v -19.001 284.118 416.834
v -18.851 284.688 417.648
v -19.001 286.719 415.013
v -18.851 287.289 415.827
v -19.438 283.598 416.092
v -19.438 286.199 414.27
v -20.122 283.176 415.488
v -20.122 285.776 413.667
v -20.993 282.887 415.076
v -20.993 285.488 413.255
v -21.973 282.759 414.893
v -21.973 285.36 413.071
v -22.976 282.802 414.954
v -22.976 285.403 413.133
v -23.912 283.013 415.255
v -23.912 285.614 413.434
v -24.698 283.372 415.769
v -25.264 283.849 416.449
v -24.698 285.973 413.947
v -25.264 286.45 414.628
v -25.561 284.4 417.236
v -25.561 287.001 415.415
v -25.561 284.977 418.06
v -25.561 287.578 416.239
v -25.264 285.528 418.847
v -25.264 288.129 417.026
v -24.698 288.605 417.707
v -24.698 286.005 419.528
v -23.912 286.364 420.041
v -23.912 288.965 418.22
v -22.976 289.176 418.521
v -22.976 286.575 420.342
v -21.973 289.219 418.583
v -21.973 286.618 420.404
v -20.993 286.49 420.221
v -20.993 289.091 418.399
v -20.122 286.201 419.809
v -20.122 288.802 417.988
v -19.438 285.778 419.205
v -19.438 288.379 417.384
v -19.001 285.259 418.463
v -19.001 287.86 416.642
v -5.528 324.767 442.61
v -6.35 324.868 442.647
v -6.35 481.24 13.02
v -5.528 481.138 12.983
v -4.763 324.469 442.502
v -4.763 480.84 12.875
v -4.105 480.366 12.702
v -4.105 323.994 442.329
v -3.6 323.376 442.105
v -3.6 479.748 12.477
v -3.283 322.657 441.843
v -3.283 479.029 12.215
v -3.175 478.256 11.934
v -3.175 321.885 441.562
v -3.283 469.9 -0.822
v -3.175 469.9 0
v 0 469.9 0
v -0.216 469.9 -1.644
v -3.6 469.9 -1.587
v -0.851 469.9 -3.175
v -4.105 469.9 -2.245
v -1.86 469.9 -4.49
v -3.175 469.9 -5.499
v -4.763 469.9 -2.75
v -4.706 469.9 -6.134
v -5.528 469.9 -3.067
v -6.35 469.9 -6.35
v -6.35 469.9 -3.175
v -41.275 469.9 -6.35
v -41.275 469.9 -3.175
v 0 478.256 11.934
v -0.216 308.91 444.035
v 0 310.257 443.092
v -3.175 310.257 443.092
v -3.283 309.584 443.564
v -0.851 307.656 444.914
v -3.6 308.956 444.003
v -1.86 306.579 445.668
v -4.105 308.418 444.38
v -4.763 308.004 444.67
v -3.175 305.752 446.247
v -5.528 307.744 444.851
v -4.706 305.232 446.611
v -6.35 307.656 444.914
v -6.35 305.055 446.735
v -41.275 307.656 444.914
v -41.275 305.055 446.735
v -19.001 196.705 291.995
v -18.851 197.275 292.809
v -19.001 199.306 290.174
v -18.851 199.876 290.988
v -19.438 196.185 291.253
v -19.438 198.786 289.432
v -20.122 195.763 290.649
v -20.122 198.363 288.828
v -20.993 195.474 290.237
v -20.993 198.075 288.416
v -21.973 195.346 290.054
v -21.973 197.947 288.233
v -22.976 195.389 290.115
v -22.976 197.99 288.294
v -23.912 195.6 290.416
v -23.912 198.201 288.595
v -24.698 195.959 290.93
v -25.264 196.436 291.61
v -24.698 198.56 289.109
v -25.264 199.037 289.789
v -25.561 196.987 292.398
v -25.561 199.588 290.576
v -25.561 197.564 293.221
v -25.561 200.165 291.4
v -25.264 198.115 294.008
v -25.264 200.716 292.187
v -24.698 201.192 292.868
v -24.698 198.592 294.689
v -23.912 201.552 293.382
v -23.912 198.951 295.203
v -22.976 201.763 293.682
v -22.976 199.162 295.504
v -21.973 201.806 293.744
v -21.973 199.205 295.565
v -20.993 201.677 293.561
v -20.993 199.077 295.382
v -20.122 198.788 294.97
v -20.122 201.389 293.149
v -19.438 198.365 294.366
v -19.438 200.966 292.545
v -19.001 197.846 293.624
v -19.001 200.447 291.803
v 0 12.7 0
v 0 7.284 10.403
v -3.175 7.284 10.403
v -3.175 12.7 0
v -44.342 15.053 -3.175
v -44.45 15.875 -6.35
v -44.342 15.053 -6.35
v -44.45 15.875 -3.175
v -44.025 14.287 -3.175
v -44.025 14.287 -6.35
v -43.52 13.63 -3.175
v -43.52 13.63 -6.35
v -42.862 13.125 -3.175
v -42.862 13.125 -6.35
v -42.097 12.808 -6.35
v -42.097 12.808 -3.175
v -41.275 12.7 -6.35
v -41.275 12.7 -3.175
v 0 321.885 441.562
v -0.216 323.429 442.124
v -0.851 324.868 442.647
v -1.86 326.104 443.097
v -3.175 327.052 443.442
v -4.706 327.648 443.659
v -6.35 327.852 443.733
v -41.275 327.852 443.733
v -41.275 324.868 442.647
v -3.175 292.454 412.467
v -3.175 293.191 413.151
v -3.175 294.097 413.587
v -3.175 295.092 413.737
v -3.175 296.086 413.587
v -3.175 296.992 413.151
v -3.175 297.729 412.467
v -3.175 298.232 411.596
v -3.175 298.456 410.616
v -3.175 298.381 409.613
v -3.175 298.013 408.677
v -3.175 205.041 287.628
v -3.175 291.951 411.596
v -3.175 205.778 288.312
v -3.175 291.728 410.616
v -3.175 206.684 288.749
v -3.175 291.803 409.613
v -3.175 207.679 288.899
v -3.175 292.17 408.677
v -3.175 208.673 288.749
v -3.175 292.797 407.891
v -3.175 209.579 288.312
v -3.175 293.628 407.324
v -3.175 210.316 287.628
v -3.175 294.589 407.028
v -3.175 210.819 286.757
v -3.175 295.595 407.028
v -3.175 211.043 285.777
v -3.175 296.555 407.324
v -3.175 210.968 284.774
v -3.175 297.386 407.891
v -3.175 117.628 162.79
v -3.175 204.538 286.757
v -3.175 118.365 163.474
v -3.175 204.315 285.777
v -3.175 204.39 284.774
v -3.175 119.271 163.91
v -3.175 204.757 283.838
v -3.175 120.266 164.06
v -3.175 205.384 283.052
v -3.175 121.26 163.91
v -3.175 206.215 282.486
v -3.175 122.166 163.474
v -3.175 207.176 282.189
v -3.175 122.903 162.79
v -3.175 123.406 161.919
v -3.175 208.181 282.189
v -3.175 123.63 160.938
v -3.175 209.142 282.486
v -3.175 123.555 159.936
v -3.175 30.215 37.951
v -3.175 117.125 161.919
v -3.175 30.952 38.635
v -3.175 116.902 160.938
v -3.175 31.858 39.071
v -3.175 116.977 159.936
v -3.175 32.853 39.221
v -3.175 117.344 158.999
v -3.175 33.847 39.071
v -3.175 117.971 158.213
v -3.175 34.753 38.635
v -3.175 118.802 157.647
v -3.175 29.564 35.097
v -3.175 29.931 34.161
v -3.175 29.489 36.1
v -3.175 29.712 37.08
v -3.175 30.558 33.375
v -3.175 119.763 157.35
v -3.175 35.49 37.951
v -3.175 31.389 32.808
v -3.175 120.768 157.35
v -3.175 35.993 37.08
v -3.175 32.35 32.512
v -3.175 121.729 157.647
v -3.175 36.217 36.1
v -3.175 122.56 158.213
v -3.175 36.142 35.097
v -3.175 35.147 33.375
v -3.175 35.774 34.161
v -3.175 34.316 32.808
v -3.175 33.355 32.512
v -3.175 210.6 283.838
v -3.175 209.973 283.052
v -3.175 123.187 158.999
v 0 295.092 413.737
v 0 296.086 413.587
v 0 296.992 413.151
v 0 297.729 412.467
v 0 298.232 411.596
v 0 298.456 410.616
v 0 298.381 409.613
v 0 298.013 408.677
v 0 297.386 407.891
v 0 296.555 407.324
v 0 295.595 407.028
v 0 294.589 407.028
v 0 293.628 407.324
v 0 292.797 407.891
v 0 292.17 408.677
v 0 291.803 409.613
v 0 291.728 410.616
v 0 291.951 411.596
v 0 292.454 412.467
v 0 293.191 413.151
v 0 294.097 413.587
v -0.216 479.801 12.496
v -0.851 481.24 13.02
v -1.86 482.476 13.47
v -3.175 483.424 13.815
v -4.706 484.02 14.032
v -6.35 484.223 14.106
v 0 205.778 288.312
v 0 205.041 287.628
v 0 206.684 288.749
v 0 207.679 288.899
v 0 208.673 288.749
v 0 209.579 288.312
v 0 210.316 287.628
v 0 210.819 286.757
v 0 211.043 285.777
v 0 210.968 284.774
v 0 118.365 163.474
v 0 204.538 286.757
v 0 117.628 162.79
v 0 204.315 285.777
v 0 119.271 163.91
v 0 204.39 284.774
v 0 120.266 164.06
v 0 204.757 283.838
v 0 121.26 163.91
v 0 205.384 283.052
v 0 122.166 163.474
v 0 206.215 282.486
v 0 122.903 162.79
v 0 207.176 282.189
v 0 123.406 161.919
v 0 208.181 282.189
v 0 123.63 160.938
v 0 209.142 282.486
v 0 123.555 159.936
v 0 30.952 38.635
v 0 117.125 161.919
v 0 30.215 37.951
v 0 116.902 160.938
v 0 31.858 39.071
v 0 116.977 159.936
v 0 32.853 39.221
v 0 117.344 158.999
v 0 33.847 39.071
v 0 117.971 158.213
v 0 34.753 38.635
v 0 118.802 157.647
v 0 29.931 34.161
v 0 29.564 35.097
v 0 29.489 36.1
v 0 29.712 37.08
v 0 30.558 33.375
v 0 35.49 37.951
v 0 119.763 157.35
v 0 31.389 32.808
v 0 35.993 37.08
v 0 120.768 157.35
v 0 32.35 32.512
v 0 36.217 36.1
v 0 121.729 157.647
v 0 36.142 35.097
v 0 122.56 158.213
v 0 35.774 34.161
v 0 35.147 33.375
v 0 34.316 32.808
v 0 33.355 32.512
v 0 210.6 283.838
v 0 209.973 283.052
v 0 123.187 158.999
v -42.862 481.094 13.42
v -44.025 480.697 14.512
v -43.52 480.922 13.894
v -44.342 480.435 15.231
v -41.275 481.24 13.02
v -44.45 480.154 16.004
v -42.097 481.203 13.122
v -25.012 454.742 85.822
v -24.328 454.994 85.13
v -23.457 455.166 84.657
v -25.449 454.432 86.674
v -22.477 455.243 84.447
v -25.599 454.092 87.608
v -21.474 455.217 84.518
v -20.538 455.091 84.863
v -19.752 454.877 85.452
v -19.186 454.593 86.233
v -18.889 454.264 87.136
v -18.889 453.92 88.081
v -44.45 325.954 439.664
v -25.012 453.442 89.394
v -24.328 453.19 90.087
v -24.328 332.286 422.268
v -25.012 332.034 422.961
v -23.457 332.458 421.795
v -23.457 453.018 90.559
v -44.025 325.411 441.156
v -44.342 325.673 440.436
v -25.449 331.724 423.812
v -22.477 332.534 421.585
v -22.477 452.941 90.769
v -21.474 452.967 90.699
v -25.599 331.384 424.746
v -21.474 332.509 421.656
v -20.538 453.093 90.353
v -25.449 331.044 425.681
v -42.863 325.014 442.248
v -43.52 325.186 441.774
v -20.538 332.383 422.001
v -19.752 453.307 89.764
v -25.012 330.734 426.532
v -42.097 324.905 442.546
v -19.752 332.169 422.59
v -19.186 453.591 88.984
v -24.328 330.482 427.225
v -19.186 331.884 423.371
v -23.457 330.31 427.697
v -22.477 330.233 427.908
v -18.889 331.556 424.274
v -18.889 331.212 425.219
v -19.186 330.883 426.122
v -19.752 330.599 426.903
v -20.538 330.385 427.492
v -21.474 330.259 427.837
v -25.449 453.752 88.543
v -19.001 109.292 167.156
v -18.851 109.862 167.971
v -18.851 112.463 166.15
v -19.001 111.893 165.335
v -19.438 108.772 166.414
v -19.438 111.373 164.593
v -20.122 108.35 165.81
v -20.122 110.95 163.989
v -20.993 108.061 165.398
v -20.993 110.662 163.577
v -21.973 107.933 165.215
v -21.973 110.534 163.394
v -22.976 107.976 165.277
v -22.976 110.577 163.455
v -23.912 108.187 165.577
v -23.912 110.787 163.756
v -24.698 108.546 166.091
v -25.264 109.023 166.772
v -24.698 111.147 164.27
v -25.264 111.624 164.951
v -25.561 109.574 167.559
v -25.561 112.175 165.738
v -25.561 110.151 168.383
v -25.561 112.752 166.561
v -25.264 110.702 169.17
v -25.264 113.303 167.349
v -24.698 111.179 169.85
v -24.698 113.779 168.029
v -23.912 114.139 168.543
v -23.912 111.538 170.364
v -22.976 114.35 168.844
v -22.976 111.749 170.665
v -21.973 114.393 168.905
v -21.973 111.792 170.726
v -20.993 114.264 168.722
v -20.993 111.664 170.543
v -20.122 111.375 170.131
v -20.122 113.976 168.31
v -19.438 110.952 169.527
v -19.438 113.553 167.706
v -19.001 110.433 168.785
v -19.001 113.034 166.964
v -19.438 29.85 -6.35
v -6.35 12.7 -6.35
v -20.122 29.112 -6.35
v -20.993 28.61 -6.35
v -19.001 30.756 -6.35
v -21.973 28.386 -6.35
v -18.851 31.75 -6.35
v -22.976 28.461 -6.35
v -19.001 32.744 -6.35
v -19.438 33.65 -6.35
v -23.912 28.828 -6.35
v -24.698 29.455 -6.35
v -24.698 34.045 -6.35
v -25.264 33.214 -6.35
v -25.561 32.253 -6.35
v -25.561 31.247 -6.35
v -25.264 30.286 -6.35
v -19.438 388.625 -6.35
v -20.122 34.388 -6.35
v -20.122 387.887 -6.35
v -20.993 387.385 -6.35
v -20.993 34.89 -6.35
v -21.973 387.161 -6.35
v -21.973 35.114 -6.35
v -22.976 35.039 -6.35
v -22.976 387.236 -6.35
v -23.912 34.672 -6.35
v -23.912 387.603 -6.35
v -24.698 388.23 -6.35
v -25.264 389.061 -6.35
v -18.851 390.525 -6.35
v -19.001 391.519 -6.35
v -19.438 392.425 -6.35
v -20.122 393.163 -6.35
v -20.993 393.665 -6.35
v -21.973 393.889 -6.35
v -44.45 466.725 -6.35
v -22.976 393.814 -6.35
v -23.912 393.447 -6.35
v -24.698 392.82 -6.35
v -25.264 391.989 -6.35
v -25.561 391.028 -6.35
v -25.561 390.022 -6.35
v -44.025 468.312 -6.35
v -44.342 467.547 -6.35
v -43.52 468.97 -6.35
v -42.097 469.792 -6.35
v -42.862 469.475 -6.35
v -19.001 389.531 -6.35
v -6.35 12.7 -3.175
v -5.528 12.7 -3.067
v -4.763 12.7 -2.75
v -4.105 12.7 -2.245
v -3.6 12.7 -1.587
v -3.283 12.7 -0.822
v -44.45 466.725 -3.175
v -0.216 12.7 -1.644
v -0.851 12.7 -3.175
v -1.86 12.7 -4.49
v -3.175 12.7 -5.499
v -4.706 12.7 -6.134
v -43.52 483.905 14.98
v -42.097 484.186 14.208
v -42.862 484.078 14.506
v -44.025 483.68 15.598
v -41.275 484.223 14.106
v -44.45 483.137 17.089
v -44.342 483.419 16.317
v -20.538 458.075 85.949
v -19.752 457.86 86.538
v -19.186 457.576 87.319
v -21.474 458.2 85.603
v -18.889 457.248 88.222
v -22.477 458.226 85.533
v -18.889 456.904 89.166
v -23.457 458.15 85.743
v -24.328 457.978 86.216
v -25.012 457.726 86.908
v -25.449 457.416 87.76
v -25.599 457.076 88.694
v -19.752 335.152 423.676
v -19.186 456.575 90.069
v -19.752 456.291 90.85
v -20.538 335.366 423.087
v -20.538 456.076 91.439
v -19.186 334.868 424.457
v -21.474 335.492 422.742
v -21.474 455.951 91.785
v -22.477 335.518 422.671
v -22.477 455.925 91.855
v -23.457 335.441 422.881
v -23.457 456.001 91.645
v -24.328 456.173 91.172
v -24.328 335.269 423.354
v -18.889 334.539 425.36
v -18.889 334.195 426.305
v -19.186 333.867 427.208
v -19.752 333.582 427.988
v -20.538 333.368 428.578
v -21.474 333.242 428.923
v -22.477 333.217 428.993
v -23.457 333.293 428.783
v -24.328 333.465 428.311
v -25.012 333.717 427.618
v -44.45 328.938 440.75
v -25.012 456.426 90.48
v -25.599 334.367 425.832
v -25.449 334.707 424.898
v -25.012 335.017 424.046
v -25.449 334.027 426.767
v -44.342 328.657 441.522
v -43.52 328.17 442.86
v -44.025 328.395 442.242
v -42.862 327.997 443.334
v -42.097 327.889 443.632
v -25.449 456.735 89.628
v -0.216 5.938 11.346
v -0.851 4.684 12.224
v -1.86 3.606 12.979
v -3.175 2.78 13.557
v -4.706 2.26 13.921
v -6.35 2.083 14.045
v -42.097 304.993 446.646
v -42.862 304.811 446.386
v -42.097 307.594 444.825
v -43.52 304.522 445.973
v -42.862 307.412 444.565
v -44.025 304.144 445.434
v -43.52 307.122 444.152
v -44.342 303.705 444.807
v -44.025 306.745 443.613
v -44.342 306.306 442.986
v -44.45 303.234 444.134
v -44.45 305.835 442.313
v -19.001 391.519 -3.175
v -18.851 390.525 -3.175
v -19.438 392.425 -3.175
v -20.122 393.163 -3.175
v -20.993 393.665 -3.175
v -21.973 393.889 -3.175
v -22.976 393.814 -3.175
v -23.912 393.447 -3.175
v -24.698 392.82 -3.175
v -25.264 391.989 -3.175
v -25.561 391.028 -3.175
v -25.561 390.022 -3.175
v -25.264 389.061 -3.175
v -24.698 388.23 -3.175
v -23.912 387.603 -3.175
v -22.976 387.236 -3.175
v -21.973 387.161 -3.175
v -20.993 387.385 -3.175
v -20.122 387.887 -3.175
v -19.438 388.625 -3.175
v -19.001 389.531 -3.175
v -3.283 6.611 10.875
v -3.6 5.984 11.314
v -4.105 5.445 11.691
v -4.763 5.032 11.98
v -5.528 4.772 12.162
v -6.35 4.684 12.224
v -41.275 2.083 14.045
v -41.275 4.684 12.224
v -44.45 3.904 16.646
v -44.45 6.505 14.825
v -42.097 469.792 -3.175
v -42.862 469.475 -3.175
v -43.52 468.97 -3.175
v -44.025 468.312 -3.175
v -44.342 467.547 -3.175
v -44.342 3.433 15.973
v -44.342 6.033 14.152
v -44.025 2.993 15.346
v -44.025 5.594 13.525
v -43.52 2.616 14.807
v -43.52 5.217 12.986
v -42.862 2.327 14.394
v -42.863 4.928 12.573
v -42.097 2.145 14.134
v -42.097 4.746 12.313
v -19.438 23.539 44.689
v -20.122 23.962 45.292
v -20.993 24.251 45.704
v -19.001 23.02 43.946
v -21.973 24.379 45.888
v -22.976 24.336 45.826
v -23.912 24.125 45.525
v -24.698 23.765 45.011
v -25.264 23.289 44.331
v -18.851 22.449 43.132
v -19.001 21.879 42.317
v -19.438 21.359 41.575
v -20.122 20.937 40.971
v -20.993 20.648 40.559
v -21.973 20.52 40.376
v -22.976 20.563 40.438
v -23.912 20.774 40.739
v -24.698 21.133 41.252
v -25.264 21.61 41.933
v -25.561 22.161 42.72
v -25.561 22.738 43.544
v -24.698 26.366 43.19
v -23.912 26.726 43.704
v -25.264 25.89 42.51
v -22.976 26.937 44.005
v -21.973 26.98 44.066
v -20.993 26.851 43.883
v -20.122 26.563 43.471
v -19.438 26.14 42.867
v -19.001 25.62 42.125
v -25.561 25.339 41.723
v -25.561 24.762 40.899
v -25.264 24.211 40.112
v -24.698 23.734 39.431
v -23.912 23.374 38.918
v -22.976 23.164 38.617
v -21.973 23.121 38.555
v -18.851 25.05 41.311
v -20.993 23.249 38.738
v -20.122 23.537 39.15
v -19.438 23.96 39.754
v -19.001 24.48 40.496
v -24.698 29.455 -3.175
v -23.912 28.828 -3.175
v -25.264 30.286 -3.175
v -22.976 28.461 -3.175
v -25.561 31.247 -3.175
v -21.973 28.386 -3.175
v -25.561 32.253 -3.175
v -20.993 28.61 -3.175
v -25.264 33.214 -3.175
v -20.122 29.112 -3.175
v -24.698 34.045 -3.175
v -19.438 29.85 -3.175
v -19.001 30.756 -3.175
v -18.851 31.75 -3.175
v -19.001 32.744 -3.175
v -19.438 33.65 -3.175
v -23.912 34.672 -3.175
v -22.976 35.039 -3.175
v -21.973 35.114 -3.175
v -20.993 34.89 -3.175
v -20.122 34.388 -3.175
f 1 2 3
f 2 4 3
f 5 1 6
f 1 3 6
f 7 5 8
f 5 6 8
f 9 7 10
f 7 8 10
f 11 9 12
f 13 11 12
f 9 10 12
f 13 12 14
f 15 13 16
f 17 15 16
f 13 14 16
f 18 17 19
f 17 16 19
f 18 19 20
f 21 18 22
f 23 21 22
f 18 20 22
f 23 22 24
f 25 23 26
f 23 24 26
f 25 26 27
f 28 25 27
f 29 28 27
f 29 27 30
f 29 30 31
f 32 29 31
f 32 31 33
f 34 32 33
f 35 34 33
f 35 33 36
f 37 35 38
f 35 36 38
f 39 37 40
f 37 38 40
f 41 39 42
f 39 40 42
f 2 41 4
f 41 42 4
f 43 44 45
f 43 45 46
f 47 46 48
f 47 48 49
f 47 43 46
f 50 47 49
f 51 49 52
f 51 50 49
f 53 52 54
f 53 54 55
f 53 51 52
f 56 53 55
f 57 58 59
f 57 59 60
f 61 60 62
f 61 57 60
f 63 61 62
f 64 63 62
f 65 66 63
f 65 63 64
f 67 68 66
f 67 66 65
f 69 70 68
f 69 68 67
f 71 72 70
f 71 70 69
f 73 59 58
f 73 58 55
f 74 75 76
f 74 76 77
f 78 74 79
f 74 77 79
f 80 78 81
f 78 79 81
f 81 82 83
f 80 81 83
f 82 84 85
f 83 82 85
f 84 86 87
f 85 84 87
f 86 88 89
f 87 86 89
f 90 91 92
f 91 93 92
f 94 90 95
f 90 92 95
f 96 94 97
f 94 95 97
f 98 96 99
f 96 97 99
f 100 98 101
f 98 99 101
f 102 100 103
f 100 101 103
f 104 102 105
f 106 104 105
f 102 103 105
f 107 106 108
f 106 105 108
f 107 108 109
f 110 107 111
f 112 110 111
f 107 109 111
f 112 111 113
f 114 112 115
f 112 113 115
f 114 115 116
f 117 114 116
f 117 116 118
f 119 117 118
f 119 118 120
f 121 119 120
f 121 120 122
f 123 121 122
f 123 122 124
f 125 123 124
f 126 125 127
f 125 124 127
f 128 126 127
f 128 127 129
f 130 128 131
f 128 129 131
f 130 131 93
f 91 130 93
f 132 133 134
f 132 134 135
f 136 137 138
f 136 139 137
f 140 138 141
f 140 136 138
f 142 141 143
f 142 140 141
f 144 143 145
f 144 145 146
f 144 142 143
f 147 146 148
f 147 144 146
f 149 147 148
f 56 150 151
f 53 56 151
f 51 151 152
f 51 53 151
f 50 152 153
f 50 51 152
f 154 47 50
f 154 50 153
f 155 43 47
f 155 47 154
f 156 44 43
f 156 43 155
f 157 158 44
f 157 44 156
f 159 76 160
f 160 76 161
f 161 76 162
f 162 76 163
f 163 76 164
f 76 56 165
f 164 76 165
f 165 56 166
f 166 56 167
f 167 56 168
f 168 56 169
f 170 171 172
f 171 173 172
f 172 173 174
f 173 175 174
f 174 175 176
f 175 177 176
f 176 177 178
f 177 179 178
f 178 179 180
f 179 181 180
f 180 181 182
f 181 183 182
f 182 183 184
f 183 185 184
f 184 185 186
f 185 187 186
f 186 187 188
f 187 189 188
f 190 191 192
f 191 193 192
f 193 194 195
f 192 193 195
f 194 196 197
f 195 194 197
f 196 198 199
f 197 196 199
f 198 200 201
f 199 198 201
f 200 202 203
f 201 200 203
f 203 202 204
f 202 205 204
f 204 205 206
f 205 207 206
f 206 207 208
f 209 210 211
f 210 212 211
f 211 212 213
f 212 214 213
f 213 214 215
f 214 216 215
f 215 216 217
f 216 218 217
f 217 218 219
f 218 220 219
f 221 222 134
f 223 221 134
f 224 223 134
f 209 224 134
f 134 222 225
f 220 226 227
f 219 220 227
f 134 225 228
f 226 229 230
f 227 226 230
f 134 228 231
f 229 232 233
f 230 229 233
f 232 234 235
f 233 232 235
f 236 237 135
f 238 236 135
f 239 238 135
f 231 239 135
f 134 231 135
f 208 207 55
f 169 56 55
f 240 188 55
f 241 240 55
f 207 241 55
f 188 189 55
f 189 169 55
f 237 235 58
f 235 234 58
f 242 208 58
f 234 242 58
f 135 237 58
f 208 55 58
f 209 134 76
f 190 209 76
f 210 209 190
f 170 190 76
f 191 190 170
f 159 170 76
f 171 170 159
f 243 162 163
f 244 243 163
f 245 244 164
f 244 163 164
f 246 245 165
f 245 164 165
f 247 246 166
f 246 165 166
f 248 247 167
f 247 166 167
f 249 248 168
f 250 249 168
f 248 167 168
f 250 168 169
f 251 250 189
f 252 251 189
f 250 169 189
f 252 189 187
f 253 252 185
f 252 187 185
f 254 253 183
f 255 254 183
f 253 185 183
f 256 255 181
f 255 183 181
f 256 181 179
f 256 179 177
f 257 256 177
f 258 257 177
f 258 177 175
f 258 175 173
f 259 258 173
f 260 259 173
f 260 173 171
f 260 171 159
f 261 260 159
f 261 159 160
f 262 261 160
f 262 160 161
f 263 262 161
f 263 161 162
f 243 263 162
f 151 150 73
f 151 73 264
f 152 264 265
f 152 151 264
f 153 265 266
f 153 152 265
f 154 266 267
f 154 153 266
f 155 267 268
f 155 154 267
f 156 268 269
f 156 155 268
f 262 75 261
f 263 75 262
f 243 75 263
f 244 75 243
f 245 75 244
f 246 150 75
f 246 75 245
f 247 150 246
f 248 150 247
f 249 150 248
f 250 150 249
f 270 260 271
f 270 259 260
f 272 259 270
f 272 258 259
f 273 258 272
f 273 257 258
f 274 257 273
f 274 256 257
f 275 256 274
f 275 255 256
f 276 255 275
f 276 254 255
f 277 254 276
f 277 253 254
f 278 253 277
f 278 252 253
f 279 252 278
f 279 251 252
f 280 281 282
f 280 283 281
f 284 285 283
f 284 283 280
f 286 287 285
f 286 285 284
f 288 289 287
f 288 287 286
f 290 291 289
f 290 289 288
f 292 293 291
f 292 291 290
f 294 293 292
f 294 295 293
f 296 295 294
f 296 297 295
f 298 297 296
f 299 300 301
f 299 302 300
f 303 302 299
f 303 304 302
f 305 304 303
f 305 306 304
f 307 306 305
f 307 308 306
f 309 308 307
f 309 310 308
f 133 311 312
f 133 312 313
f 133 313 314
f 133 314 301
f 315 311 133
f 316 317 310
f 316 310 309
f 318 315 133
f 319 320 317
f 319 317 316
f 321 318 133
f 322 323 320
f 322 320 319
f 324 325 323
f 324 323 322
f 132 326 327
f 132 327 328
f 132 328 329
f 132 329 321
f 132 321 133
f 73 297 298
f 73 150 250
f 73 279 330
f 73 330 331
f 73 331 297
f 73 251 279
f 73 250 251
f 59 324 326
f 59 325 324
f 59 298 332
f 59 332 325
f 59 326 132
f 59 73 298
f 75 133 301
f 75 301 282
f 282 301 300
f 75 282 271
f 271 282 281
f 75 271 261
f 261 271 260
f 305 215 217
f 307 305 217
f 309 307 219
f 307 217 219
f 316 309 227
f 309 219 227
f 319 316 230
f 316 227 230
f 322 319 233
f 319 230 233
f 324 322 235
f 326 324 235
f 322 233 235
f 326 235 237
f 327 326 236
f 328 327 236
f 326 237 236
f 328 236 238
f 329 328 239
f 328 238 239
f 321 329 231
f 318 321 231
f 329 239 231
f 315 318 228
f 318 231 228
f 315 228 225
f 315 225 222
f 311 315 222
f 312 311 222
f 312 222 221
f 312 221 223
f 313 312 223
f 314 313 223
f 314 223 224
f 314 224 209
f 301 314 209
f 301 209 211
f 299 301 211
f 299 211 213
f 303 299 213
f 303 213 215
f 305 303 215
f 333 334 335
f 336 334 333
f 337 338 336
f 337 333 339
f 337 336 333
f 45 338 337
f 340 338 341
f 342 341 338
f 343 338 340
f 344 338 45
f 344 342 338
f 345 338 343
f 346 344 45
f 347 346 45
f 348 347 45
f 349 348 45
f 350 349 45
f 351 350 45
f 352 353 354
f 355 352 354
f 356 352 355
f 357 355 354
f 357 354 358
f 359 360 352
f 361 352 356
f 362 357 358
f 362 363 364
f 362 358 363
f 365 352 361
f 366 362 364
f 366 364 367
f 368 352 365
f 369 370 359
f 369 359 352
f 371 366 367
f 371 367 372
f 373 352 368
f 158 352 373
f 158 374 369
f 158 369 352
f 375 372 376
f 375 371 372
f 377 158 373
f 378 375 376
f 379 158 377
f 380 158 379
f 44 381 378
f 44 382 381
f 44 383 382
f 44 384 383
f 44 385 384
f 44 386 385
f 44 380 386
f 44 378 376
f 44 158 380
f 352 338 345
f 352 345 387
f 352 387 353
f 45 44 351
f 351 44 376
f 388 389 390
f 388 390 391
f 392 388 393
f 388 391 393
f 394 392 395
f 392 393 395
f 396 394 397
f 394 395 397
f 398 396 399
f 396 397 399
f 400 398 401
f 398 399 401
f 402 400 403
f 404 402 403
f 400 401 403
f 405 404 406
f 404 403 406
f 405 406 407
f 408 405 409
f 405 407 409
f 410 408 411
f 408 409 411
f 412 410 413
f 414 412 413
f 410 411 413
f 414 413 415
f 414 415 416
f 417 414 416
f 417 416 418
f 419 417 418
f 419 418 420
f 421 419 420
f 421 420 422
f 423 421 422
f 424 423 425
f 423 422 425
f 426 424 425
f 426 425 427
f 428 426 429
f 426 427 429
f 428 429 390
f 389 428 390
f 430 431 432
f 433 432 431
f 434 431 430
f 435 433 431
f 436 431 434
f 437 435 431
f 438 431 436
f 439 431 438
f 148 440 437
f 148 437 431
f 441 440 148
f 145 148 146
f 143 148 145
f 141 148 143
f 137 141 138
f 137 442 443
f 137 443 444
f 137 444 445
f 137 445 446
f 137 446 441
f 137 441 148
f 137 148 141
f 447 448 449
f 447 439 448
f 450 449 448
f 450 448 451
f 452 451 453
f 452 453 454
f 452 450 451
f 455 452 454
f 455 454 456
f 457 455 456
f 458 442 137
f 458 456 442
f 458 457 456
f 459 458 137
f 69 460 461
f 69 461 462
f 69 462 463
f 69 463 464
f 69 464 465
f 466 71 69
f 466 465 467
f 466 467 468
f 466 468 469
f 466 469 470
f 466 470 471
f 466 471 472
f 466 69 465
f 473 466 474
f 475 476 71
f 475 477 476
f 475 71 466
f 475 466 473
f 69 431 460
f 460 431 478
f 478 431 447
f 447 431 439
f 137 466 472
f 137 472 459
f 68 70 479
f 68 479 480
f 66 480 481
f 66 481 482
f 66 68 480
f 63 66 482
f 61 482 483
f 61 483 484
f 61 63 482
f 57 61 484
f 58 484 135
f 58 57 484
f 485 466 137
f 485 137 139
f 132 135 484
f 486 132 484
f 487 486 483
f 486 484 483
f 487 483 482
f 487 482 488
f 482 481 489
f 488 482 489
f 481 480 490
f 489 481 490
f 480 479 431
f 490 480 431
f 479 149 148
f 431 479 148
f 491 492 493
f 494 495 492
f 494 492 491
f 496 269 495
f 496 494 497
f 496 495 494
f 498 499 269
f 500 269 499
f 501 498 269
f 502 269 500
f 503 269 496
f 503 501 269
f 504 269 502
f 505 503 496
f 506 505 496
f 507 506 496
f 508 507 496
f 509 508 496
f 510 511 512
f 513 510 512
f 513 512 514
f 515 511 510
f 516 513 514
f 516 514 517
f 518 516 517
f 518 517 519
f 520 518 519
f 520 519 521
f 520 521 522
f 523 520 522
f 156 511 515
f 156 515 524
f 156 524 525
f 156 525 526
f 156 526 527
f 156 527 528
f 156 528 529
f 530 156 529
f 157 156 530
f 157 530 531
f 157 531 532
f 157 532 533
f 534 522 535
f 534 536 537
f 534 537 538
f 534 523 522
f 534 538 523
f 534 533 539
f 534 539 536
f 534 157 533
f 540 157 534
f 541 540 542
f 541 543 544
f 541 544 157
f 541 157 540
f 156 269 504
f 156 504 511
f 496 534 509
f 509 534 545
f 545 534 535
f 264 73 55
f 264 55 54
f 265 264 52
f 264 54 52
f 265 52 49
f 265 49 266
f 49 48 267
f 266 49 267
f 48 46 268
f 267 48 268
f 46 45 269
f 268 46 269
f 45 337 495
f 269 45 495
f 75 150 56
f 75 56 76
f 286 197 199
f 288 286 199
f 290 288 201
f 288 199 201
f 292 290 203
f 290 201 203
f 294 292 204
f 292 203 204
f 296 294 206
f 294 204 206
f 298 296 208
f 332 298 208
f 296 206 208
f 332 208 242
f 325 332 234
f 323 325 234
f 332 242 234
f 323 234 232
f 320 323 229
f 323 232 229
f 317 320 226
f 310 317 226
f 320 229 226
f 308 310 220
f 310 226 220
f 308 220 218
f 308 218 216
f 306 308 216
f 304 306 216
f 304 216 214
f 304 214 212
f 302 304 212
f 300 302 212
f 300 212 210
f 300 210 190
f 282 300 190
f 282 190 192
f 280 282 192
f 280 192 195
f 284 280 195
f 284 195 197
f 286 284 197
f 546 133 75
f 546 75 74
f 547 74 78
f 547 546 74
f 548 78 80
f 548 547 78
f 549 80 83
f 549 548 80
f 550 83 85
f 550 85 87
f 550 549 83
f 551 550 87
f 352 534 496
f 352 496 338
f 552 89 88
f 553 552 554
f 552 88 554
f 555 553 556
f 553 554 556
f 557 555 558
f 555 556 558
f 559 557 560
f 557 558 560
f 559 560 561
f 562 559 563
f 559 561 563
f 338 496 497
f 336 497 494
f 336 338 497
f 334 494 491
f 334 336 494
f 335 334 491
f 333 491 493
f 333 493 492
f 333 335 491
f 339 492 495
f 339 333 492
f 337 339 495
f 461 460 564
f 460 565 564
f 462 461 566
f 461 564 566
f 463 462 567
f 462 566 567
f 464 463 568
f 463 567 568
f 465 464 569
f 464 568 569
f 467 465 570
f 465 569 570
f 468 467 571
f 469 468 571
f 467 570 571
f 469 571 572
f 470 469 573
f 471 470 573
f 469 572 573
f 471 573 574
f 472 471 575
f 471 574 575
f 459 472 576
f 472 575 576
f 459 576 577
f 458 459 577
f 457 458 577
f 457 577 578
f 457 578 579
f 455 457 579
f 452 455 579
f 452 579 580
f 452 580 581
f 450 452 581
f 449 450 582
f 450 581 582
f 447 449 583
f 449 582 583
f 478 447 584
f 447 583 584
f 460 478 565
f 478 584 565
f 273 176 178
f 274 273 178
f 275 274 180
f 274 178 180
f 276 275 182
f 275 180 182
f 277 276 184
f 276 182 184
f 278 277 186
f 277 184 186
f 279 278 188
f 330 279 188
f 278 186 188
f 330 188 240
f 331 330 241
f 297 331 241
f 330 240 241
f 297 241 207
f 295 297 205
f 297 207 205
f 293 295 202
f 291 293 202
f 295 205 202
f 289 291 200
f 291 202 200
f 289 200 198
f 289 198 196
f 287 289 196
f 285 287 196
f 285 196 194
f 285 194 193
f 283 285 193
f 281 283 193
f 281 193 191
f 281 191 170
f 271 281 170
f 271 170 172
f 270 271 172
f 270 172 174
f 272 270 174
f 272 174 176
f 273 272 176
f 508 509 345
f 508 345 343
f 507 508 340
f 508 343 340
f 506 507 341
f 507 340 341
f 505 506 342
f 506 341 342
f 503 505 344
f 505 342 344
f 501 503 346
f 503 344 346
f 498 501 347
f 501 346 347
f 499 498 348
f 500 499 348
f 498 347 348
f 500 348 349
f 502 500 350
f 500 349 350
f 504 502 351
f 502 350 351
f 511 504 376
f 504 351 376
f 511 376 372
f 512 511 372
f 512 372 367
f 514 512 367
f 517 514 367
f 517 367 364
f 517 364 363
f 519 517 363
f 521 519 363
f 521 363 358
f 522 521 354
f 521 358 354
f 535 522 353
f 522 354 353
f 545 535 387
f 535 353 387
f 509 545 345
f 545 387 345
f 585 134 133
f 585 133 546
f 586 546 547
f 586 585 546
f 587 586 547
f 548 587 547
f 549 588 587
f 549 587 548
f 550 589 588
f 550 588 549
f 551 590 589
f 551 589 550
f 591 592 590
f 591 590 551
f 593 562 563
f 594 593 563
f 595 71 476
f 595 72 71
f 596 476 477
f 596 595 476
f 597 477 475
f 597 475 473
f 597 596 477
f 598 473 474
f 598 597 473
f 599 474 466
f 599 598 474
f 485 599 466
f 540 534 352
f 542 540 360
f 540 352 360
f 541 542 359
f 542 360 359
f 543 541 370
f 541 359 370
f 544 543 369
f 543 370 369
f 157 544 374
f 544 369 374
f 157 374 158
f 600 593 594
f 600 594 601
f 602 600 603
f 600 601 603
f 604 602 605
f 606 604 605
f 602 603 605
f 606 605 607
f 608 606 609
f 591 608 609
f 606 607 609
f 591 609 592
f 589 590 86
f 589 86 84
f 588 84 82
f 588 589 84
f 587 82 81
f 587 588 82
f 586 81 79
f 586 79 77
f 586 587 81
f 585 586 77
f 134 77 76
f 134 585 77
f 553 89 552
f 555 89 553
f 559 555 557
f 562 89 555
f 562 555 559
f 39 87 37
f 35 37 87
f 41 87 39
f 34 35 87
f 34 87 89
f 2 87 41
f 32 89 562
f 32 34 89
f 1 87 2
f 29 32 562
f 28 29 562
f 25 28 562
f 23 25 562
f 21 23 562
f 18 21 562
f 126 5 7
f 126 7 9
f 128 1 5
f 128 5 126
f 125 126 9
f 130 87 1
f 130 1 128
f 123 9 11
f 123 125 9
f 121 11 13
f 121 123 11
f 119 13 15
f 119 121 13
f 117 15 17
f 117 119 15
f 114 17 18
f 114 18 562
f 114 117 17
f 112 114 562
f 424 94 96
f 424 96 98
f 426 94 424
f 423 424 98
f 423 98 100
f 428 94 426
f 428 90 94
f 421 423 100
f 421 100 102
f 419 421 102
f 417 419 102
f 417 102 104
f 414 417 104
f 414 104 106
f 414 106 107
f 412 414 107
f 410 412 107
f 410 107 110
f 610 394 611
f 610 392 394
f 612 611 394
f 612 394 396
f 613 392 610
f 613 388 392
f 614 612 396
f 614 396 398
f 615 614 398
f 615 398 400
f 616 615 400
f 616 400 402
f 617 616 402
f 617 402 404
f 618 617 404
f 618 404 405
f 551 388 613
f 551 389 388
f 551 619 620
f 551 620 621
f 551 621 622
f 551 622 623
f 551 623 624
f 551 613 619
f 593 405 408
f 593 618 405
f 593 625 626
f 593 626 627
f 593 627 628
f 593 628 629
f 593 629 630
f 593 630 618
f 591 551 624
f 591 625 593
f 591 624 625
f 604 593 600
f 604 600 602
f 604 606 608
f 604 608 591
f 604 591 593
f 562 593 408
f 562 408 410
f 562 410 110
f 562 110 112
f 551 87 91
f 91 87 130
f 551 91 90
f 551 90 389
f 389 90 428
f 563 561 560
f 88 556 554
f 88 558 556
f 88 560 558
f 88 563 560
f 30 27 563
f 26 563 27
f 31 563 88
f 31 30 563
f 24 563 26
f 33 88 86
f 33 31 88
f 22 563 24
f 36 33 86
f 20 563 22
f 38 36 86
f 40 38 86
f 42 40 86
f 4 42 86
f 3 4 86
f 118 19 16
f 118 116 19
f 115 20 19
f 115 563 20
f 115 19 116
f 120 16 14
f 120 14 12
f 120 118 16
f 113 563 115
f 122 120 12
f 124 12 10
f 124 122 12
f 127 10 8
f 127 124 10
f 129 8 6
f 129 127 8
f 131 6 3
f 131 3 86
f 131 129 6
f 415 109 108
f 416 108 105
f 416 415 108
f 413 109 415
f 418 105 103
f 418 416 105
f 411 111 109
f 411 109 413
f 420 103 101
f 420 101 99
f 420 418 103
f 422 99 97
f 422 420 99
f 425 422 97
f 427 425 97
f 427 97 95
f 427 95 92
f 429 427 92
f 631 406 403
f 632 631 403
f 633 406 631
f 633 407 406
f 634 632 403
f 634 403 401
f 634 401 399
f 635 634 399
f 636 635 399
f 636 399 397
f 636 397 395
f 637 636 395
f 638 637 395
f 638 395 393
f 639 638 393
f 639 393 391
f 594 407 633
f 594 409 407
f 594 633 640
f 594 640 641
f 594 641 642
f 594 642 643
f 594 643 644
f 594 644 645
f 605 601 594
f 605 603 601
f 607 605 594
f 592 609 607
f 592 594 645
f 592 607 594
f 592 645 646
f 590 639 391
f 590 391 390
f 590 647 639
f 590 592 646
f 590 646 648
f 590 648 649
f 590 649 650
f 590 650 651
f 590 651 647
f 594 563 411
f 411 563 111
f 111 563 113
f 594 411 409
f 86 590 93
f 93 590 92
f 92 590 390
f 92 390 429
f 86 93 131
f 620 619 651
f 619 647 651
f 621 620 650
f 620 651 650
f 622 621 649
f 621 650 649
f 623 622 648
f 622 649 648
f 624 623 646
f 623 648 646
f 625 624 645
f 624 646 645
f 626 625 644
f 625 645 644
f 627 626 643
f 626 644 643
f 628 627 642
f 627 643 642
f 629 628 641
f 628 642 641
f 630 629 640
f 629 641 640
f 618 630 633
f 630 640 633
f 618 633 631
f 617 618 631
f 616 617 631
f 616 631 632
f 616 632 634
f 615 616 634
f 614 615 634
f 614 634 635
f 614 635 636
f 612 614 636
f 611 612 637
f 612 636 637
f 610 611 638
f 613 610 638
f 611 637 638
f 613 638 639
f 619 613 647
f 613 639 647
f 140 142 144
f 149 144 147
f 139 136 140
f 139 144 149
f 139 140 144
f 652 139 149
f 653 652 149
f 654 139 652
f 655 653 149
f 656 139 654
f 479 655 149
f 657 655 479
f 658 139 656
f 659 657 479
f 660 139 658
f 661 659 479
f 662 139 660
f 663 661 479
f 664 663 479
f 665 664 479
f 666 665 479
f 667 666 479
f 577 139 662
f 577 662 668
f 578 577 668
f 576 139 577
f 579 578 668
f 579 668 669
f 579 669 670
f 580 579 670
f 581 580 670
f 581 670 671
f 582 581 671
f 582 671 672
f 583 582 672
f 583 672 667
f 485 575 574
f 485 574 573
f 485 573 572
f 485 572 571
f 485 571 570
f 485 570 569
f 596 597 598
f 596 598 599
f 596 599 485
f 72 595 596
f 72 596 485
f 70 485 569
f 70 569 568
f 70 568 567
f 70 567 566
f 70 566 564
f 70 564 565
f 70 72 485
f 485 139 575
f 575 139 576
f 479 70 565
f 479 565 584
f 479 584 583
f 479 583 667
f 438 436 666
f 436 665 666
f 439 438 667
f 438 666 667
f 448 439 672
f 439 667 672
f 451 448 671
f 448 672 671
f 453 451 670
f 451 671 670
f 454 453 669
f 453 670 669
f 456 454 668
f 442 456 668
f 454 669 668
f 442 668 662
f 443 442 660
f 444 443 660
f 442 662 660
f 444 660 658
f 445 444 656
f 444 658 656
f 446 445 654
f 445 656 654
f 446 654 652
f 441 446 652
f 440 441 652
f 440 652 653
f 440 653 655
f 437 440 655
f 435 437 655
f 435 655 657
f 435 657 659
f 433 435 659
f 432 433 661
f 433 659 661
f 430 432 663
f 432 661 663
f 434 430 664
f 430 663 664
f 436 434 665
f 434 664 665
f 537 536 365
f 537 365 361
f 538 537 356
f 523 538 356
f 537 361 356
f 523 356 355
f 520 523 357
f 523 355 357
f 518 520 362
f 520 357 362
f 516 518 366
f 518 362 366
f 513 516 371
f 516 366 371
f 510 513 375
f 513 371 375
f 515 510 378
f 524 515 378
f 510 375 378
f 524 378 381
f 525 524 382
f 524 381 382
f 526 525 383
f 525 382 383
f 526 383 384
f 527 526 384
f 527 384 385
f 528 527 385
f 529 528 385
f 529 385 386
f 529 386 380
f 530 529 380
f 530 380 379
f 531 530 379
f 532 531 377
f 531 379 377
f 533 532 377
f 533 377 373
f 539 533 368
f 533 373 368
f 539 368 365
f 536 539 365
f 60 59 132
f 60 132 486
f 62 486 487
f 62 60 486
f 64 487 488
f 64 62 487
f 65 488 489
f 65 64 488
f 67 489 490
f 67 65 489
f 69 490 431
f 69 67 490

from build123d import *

# Parameters (mm, degrees)
BASE_FLANGE1_DEPTH                   = 3.175
EDGE_FLANGE1_DEPTH                   = 528.215976366
EDGE_FLANGE1_BEND_DEPTH              = 457.2
EDGE_FLANGE1_BEND_2_DEPTH            = 457.2
F_17_64_0_26563_DIAMETER_HOLE1_D     = 6.747002
F_17_64_0_26563_DIAMETER_HOLE1_DEPTH = 3.175
F_17_64_0_26563_DIAMETER_HOLE1_TIP   = 2.027003899
F_17_64_0_26563_DIAMETER_HOLE2_D     = 6.747002
F_17_64_0_26563_DIAMETER_HOLE2_DEPTH = 3.175
F_17_64_0_26563_DIAMETER_HOLE2_TIP   = 2.027003899
FILLET1_R                            = 3.175
F_17_64_0_26563_DIAMETER_HOLE3_D     = 6.747002
F_17_64_0_26563_DIAMETER_HOLE3_DEPTH = 3.175
F_17_64_0_26563_DIAMETER_HOLE3_TIP   = 2.027003899
F_17_64_0_26563_DIAMETER_HOLE4_D     = 6.747002


# Sheet-metal steps are written as plain solids
with BuildPart() as part:
    # Sketch1 → Base-Flange1 (new body)
    with BuildSketch(Plane(origin=(0, 0, 0), x_dir=(0, 0, -1), z_dir=(1, 0, 0))):
        Polygon((0, 12.7), (0, 469.9), (-11.934096284, 478.25634418), (-441.561562507, 321.884734651), (-443.092427829, 310.256658089), (-10.403230962, 7.284420742), align=None)
    extrude(amount=-BASE_FLANGE1_DEPTH)

    # Edge-Flange1 section (across the edge) → Edge-Flange1 (add)
    with BuildSketch(Plane(origin=(-3.175, 4.683613001, 12.224336148), x_dir=(-3.4914813388431334e-15, 0.819152044288993, -0.5735764363510446), z_dir=(0, 0.5735764363510446, 0.819152044288993))):
        with BuildLine():
            Line((-3.175, 3.175), (-3.175, 41.275))
            Line((-3.175, 41.275), (0, 41.275))
            Line((0, 41.275), (0, 3.175))
            ThreePointArc((0, 3.175), (0.92993597, 0.92993597), (3.175, 0))
            Line((3.175, 0), (3.175, -3.175))
            ThreePointArc((3.175, -3.175), (-1.315128061, -1.315128061), (-3.175, 3.175))
        make_face()
    extrude(amount=EDGE_FLANGE1_DEPTH)

    # Edge-Flange1 section 2 (across the edge) → Edge-Flange1 bend (add)
    with BuildSketch(Plane(origin=(-3.175, 469.9, -3.175), x_dir=(0, 0, 1), z_dir=(0, -1, 0))):
        with BuildLine():
            Line((-3.175, 3.175), (-3.175, 41.275))
            Line((-3.175, 41.275), (0, 41.275))
            Line((0, 41.275), (0, 3.175))
            ThreePointArc((0, 3.175), (0.92993597, 0.92993597), (3.175, 0))
            Line((3.175, 0), (3.175, -3.175))
            ThreePointArc((3.175, -3.175), (-1.315128061, -1.315128061), (-3.175, 3.175))
        make_face()
    extrude(amount=EDGE_FLANGE1_BEND_DEPTH)

    # Edge-Flange1 section 3 (across the edge) → Edge-Flange1 bend 2 (add)
    with BuildSketch(Plane(origin=(-3.175, 324.868258722, 442.647476462), x_dir=(-3.4914813388431334e-15, -0.9396926207859071, -0.3420201433256725), z_dir=(0, 0.3420201433256725, -0.9396926207859071))):
        with BuildLine():
            Line((-3.175, 3.175), (-3.175, 41.275))
            Line((-3.175, 41.275), (0, 41.275))
            Line((0, 41.275), (0, 3.175))
            ThreePointArc((0, 3.175), (0.92993597, 0.92993597), (3.175, 0))
            Line((3.175, 0), (3.175, -3.175))
            ThreePointArc((3.175, -3.175), (-1.315128061, -1.315128061), (-3.175, 3.175))
        make_face()
    extrude(amount=EDGE_FLANGE1_BEND_2_DEPTH)

    # 17/64 (0.26563) Diameter Hole1
    with Locations(Plane(origin=(0, 0, -6.35), x_dir=(-1, 0, 0), z_dir=(0, 0, -1))):
        with Locations((22.225, 390.525), (22.225, 31.75)):
            Hole(F_17_64_0_26563_DIAMETER_HOLE1_D / 2, depth=F_17_64_0_26563_DIAMETER_HOLE1_DEPTH)
            with Locations((0, 0, -(F_17_64_0_26563_DIAMETER_HOLE1_DEPTH + F_17_64_0_26563_DIAMETER_HOLE1_TIP / 2))):  # 118° drill point
                Cone(0, F_17_64_0_26563_DIAMETER_HOLE1_D / 2, F_17_64_0_26563_DIAMETER_HOLE1_TIP, mode=Mode.SUBTRACT)

    # 17/64 (0.26563) Diameter Hole2
    with Locations(Plane(origin=(0, 432.113572267, 157.276478127), x_dir=(1, 0, 0), z_dir=(3.4475760670445246e-15, 0.939692620785907, 0.3420201433256725))):
        with Locations((-22.225, 72.983921169), (-22.225, -285.791078831)):
            Hole(F_17_64_0_26563_DIAMETER_HOLE2_D / 2, depth=F_17_64_0_26563_DIAMETER_HOLE2_DEPTH)
            with Locations((0, 0, -(F_17_64_0_26563_DIAMETER_HOLE2_DEPTH + F_17_64_0_26563_DIAMETER_HOLE2_TIP / 2))):  # 118° drill point
                Cone(0, F_17_64_0_26563_DIAMETER_HOLE2_D / 2, F_17_64_0_26563_DIAMETER_HOLE2_TIP, mode=Mode.SUBTRACT)

    # Fillet1
    fillet1_edges = [part.edges().sort_by_distance(p)[0] for p in [
        (-44.45, 3.383209131, 13.134888741),
        (-44.45, 306.355446478, 445.824085607),
        (-44.45, 469.9, -4.7625),
        (-44.45, 12.7, -4.7625),
        (-44.45, 326.360020758, 443.19043344),
        (-44.45, 482.731630286, 13.562967217),
    ]]
    fillet(fillet1_edges, radius=FILLET1_R)

    # 17/64 (0.26563) Diameter Hole3
    with Locations(Plane(origin=(0, -5.201615481, 3.642210371), x_dir=(-1, 0, 0), z_dir=(2.9747797534781195e-15, -0.819152044288993, 0.5735764363510445))):
        with Locations((22.225, -48.207988183), (22.225, -200.607988183), (22.225, -353.007988183), (22.225, -505.407988183)):
            Hole(F_17_64_0_26563_DIAMETER_HOLE3_D / 2, depth=F_17_64_0_26563_DIAMETER_HOLE3_DEPTH)
            with Locations((0, 0, -(F_17_64_0_26563_DIAMETER_HOLE3_DEPTH + F_17_64_0_26563_DIAMETER_HOLE3_TIP / 2))):  # 118° drill point
                Cone(0, F_17_64_0_26563_DIAMETER_HOLE3_D / 2, F_17_64_0_26563_DIAMETER_HOLE3_TIP, mode=Mode.SUBTRACT)

    # 17/64 (0.26563) Diameter Hole4 (through all)
    with Locations(Plane(origin=(0, 0, 0), x_dir=(0, 0, -1), z_dir=(1, 0, 0))):
        with Locations((-410.363776349, 295.091728247), (-285.5250048, 207.678679347), (-160.68623325, 120.265630447), (-35.8474617, 32.852581547)):
            Hole(F_17_64_0_26563_DIAMETER_HOLE4_D / 2)


solid = part.part
